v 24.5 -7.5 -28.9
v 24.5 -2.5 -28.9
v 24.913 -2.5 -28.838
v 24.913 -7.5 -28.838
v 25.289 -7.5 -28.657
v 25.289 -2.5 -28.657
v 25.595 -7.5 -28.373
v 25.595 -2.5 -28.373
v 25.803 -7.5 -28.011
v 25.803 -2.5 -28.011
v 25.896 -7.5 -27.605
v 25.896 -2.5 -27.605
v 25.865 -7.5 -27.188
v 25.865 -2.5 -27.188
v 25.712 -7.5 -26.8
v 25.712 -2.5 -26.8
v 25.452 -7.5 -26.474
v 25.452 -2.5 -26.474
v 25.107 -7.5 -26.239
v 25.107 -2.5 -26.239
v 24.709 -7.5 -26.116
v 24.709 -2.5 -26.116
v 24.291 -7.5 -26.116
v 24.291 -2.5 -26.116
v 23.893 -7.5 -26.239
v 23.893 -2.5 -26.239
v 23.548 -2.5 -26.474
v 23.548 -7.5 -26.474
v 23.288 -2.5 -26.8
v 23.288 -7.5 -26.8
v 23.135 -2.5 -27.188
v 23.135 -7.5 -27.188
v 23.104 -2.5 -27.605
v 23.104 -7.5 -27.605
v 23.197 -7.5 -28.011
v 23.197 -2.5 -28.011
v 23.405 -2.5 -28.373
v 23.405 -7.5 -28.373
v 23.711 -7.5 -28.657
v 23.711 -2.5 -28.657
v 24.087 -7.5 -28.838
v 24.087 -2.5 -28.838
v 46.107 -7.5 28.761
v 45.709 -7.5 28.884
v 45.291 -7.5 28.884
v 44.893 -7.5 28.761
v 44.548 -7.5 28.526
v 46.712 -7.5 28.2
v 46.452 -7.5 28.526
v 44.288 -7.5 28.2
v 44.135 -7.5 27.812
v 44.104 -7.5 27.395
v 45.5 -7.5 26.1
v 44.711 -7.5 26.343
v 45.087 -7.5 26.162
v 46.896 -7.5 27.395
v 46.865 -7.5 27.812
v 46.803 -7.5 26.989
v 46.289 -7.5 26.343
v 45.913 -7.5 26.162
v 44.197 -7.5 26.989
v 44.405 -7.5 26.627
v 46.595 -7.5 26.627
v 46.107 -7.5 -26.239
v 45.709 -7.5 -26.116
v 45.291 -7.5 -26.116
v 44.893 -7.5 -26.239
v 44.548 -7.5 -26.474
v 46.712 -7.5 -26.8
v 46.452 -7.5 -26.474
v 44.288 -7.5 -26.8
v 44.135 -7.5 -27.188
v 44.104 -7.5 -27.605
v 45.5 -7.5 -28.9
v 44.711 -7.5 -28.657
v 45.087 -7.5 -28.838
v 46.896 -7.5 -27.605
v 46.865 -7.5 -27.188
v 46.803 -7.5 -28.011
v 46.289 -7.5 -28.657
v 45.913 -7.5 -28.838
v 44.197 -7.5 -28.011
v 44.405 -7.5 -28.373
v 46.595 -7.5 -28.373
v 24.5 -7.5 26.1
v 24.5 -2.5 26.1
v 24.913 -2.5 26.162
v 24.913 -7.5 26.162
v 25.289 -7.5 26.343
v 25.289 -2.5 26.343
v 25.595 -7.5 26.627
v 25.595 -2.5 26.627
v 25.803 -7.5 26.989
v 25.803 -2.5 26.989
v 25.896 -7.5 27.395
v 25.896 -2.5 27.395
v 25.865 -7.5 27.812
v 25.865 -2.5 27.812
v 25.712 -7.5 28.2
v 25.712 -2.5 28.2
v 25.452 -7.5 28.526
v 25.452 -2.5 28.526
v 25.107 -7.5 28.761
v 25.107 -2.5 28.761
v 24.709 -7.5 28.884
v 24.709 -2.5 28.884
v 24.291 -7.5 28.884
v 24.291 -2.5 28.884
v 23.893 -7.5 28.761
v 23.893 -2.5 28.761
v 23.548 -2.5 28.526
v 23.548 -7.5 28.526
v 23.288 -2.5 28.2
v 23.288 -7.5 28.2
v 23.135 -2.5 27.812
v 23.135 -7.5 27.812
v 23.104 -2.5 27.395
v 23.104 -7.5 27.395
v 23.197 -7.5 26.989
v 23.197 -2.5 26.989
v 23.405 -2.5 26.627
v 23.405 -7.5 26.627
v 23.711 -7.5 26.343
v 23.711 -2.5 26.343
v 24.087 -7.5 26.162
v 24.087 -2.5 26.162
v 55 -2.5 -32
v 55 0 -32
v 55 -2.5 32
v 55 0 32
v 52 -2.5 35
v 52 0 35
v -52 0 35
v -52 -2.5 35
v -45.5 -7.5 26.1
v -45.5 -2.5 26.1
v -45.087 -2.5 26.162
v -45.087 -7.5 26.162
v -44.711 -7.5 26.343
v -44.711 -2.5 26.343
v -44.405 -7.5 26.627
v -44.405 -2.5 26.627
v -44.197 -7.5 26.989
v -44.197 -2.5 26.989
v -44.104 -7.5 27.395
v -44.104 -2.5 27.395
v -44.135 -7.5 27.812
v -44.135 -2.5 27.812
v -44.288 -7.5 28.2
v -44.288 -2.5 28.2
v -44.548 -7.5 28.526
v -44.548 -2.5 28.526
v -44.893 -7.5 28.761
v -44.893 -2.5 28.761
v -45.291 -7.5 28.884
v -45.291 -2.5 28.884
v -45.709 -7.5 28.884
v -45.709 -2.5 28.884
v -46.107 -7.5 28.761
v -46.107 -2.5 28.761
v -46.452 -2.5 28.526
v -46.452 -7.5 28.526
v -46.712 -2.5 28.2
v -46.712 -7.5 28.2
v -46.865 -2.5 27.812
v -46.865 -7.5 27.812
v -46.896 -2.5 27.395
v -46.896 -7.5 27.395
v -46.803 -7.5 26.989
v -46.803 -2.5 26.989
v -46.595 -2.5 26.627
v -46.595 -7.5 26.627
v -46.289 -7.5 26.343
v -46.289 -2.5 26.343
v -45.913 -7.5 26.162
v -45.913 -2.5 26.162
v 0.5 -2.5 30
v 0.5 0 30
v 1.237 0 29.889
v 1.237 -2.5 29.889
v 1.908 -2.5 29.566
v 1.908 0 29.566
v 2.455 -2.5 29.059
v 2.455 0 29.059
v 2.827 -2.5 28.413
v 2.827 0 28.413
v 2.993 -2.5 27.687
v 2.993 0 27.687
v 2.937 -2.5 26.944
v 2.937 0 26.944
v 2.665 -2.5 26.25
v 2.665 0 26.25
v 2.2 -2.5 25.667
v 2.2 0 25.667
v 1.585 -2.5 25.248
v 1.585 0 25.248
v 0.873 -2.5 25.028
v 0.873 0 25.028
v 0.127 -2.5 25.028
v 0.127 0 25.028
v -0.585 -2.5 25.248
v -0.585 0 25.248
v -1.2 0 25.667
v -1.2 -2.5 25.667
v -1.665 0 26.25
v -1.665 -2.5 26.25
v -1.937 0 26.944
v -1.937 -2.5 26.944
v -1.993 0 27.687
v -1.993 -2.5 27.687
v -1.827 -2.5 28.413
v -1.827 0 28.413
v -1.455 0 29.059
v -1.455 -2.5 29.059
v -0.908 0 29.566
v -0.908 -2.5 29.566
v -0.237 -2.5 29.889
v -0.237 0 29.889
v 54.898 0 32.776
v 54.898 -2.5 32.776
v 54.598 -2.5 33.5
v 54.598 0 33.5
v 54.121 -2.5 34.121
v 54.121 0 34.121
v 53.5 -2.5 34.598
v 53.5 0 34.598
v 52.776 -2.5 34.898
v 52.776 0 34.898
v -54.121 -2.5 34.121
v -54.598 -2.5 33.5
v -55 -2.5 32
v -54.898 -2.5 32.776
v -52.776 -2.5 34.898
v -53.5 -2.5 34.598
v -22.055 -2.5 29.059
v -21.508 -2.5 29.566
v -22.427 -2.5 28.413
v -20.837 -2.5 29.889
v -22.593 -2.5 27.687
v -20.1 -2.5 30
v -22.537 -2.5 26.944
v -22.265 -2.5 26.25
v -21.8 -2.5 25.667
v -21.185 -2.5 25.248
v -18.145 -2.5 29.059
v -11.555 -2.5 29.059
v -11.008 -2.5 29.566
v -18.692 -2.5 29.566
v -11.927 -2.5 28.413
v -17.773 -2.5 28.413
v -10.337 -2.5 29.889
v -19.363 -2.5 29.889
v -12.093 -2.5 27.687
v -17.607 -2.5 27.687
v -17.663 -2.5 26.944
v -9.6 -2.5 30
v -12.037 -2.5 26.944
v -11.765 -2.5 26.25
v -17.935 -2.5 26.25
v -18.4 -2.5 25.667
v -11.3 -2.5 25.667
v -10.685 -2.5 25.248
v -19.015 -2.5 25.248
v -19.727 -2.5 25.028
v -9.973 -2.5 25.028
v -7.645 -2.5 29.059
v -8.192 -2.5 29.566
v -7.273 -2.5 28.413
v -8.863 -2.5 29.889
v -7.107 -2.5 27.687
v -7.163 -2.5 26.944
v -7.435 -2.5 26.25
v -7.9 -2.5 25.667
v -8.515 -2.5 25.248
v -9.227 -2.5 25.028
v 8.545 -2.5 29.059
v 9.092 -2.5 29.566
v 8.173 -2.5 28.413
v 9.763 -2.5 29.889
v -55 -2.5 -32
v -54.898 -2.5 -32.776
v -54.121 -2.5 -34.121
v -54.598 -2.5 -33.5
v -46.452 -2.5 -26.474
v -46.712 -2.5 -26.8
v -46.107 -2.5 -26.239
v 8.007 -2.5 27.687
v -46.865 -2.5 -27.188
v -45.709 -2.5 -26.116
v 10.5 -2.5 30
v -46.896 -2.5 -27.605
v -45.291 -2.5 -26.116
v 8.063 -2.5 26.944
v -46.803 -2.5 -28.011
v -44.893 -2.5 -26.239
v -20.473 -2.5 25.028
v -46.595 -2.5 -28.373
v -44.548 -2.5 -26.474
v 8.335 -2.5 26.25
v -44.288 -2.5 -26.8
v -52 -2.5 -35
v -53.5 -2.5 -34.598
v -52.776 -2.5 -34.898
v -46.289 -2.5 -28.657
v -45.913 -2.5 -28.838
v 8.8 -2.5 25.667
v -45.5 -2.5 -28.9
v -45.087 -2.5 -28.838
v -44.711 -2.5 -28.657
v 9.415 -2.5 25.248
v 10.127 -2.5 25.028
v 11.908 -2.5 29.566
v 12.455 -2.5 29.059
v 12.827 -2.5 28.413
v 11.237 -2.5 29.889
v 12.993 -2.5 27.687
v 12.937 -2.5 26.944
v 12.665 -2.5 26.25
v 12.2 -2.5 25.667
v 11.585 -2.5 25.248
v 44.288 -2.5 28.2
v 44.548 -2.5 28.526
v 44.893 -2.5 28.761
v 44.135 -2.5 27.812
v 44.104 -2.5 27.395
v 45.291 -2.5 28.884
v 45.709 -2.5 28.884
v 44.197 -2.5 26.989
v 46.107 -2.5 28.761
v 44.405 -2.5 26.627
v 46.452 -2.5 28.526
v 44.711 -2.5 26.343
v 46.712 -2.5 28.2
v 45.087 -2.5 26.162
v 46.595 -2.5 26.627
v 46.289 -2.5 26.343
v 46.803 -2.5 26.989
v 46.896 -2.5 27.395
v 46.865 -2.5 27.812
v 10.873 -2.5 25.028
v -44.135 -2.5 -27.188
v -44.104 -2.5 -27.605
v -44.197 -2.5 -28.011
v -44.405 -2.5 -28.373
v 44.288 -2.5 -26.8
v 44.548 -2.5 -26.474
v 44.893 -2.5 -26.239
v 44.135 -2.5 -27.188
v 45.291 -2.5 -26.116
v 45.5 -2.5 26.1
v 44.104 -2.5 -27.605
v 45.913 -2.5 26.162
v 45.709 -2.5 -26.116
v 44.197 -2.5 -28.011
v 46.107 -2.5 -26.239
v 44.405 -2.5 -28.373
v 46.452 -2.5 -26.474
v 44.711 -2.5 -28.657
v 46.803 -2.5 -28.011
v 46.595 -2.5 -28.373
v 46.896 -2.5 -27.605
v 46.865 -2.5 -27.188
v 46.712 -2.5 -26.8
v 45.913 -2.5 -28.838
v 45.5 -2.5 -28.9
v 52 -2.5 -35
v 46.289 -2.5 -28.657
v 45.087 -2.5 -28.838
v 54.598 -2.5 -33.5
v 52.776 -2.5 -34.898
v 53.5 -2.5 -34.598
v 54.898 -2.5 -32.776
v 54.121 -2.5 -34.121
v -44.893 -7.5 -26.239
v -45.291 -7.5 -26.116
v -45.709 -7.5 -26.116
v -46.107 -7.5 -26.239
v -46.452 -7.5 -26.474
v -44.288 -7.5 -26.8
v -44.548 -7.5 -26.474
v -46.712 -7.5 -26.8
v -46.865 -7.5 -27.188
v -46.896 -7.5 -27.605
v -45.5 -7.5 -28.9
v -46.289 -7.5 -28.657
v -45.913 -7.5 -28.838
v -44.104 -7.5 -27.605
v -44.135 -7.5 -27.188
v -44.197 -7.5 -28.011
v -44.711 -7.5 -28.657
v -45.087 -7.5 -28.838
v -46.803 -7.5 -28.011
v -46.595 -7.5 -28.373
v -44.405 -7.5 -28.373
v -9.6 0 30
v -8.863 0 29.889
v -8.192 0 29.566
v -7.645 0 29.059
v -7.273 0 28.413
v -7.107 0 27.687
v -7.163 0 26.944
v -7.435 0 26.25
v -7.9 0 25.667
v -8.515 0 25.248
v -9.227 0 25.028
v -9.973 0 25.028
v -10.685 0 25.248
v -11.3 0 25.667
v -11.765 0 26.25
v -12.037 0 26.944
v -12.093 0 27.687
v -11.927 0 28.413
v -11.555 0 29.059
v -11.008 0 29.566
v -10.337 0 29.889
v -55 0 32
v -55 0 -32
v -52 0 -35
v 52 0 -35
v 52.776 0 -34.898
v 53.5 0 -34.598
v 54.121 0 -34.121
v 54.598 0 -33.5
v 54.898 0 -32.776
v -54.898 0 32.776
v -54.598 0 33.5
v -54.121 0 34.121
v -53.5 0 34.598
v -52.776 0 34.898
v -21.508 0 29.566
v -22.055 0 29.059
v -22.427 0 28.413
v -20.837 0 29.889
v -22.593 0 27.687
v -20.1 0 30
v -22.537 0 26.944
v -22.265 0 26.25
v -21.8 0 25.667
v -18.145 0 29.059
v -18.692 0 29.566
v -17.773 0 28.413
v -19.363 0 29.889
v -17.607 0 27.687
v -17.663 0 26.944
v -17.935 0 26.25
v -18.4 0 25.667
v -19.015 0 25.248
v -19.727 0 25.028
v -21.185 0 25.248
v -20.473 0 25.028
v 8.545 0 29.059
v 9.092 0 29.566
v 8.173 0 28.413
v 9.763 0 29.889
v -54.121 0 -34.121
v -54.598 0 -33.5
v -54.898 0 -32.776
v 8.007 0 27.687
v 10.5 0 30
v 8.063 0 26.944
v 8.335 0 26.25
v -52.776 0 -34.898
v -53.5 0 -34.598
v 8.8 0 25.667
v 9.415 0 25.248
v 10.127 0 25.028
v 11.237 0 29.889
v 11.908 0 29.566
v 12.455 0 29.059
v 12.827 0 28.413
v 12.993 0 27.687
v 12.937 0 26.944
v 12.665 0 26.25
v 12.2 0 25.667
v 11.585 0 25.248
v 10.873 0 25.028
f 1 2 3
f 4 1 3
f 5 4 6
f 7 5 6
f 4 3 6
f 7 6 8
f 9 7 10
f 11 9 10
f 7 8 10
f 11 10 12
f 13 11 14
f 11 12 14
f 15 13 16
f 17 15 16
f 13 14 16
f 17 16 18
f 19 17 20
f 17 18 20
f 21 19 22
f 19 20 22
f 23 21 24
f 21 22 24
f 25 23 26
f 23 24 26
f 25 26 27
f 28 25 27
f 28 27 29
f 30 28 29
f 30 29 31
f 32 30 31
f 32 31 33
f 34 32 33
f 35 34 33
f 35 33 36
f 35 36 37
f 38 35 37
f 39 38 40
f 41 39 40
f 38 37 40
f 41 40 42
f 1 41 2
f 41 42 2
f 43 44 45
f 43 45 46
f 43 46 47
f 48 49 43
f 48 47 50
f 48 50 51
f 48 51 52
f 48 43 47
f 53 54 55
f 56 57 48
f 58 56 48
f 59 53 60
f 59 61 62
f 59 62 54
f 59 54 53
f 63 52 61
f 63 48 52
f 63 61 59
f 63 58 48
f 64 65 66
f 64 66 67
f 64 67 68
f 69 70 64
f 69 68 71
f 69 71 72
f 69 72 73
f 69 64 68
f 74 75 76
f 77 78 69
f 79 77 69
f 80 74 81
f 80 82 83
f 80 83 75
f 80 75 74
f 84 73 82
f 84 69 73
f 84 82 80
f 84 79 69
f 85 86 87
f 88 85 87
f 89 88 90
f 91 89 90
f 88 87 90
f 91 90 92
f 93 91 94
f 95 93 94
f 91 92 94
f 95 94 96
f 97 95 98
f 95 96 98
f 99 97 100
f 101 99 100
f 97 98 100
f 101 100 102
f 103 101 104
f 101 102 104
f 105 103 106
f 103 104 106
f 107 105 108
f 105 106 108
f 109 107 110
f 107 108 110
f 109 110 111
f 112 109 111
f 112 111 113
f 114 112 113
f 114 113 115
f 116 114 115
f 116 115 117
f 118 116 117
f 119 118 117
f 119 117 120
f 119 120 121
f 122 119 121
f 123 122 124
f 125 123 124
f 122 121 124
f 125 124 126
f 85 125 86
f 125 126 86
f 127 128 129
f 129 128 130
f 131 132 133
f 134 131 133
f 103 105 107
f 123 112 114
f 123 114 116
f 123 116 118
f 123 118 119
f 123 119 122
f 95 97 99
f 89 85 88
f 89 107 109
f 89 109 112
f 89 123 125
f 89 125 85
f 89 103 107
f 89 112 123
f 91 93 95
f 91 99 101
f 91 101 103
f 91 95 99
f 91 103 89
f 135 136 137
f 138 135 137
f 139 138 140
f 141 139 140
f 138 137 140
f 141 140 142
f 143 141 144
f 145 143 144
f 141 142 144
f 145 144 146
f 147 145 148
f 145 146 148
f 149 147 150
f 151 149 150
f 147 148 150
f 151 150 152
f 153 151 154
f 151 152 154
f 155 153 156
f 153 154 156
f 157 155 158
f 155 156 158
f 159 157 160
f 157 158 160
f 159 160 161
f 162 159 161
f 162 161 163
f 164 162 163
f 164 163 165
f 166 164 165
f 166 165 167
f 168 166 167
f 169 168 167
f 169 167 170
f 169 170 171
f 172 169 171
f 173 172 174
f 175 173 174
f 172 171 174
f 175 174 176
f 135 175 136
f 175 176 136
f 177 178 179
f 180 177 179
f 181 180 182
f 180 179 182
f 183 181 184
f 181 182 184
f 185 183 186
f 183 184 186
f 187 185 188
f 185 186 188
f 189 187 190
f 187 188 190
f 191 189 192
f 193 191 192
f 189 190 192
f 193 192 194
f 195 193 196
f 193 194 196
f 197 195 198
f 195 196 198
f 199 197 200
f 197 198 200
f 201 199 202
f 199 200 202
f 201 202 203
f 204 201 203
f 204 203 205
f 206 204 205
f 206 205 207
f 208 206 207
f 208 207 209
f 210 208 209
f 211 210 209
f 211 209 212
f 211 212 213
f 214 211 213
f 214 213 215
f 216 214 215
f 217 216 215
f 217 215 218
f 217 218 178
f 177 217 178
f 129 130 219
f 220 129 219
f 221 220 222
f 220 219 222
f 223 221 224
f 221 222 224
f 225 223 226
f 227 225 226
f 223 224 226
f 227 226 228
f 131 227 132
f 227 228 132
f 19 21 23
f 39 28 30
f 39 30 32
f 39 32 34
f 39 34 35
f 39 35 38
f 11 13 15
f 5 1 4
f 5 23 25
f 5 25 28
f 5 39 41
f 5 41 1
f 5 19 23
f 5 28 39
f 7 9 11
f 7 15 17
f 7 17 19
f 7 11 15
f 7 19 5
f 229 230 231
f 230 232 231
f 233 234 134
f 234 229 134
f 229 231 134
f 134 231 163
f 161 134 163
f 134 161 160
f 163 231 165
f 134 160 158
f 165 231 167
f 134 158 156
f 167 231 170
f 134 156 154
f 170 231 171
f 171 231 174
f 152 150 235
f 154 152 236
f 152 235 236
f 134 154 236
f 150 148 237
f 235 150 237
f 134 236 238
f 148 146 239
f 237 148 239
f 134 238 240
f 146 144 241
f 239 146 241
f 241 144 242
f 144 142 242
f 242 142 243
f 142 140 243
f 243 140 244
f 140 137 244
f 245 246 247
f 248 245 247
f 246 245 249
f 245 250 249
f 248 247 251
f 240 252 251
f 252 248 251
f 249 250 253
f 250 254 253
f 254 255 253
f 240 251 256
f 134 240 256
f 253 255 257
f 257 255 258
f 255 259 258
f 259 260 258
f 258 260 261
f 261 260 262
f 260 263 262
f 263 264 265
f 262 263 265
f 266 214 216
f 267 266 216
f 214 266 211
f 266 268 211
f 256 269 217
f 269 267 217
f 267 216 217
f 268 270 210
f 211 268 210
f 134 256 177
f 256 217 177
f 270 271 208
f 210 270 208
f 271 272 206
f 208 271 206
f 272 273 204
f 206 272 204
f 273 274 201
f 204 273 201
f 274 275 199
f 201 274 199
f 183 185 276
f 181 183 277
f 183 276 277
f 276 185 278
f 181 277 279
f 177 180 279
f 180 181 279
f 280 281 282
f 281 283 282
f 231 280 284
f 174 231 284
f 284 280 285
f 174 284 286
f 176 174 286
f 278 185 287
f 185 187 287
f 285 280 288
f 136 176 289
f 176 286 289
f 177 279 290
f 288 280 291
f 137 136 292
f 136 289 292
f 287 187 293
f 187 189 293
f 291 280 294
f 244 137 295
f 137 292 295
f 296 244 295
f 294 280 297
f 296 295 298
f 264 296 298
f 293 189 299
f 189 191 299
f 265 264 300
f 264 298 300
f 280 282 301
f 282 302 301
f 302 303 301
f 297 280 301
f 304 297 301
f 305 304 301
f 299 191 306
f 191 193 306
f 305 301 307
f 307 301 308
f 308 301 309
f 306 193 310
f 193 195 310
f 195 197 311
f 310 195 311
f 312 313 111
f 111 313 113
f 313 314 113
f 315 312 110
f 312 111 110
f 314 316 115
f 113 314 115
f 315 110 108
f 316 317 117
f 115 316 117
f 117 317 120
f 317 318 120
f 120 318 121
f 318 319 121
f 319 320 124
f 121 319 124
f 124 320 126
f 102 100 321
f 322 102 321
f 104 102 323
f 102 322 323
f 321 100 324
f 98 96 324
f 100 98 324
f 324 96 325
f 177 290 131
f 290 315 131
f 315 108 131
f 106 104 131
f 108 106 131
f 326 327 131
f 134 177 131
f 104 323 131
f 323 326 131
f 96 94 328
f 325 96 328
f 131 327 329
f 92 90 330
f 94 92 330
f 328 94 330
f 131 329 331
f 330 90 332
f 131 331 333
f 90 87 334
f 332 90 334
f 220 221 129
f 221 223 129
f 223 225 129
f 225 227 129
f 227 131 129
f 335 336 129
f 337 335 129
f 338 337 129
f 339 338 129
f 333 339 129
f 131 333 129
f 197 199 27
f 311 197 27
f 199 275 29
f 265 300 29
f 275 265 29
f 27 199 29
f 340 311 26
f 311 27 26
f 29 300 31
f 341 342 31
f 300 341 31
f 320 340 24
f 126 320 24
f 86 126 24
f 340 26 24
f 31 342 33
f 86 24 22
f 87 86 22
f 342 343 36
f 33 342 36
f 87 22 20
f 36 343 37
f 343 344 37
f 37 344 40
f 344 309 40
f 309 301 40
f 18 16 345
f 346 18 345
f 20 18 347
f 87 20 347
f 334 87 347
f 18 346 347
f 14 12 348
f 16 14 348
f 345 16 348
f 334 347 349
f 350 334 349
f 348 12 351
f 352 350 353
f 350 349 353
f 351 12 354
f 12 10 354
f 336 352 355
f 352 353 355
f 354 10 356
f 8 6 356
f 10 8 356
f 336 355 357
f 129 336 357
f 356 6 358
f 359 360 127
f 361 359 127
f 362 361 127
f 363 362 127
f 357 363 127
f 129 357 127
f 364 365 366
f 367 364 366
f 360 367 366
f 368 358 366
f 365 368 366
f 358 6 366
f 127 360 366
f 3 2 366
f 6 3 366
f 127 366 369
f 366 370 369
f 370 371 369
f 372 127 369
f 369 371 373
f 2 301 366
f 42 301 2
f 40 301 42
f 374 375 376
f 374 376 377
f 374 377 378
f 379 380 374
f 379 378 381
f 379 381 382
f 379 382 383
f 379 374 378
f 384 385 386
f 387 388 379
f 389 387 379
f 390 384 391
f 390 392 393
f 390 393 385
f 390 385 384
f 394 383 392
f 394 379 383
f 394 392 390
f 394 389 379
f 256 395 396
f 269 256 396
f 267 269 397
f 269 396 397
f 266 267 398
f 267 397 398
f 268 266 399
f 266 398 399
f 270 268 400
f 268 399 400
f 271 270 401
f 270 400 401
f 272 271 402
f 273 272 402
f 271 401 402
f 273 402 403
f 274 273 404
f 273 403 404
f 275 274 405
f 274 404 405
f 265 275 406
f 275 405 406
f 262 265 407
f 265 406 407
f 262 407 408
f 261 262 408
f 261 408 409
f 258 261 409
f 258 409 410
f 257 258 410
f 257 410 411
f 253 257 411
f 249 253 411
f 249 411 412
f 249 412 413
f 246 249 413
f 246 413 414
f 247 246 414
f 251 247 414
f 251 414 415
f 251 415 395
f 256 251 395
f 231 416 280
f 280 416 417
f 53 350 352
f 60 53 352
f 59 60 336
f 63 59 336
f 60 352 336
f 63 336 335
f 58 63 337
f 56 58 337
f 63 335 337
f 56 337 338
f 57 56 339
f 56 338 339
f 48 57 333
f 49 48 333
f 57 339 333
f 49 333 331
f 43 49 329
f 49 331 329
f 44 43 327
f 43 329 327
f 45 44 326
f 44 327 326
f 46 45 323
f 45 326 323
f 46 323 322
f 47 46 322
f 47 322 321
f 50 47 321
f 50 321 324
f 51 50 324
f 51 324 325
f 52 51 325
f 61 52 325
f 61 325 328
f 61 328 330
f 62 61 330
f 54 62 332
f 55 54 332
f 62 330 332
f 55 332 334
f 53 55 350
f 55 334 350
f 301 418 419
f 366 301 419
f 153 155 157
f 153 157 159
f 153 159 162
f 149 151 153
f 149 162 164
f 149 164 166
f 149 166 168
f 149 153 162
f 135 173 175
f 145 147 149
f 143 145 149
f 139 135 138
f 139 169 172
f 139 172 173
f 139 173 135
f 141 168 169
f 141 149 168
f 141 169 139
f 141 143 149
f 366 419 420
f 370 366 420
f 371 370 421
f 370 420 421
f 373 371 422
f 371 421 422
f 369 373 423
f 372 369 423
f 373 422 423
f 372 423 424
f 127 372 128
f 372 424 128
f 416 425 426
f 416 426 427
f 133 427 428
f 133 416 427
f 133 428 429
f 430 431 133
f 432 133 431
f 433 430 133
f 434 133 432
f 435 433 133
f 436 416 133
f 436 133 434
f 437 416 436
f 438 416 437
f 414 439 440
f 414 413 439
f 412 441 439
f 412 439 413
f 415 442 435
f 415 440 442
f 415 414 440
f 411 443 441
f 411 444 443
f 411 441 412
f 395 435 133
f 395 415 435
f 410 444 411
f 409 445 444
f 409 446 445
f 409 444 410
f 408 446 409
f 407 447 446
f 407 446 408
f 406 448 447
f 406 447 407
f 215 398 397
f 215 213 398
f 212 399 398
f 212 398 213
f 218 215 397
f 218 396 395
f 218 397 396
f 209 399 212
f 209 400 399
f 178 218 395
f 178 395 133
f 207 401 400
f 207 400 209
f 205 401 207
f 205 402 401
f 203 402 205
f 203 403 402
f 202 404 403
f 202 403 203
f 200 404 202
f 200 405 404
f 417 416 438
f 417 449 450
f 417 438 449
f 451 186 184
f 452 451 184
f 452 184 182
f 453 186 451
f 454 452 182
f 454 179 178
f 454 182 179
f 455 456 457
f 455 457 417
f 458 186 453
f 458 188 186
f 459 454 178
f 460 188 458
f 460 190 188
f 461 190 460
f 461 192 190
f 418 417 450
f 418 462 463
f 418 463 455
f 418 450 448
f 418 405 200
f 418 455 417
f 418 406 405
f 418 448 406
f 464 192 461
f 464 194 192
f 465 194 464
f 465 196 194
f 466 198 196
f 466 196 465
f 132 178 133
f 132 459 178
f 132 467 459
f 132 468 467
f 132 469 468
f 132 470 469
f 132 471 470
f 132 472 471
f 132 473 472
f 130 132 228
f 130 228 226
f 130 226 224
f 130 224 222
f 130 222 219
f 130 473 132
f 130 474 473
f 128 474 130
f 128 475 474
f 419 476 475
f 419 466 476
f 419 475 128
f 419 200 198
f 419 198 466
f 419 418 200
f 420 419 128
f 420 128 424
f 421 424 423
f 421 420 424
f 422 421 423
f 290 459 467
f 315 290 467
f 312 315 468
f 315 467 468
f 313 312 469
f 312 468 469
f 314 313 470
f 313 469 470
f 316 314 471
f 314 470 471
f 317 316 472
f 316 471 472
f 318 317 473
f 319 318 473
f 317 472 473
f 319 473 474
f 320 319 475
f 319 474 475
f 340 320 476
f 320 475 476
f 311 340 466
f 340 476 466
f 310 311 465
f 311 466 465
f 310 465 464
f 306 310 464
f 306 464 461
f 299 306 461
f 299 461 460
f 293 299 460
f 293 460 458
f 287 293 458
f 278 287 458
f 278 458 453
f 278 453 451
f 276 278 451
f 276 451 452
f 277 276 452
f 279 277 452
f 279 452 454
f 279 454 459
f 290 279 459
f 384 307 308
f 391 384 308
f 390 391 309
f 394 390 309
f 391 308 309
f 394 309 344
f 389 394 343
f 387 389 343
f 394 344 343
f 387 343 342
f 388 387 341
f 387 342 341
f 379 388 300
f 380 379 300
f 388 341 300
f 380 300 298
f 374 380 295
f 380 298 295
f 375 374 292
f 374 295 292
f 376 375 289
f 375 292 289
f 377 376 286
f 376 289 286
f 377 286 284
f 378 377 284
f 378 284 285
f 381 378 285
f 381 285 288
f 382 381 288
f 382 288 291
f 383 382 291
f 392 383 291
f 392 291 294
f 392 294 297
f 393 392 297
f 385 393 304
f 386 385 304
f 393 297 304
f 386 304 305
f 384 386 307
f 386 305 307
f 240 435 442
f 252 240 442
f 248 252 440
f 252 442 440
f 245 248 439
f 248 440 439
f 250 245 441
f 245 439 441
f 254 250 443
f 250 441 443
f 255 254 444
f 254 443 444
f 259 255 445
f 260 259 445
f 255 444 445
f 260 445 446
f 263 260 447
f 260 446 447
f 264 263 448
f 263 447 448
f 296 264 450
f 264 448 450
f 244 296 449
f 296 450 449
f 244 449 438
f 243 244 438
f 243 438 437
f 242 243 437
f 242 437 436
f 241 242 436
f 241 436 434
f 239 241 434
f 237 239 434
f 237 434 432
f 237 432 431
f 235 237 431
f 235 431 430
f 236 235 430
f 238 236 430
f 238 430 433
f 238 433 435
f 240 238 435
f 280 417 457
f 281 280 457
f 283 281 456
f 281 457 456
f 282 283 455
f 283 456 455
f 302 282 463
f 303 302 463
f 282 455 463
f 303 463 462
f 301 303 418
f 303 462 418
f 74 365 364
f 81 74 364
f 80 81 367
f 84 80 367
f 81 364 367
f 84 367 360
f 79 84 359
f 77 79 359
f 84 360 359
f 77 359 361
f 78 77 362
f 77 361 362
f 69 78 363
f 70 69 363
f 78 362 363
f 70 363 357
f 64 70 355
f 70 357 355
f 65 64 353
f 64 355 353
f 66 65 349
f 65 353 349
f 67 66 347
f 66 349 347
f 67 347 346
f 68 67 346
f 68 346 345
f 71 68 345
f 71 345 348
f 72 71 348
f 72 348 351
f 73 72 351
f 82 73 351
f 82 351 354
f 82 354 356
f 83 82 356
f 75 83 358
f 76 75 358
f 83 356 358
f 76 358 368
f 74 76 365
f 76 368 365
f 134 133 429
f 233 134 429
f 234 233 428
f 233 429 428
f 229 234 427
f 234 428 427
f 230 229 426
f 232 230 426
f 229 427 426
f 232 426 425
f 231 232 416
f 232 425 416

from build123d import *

# Parameters (mm, degrees)
BOSS_EXTRUDE1_DEPTH  = 2.5
BOSS_EXTRUDE6_DEPTH  = 24.5
CUT_EXTRUDE7_REACH   = 72.562
SKETCH3_R            = 2.5
BOSS_EXTRUDE11_START = -24.5
SKETCH12_R           = 1.4
BOSS_EXTRUDE11_DEPTH = 20
CUT_EXTRUDE11_REACH  = 120.55
SKETCH13_R           = 6.15
BOSS_EXTRUDE13_START = -4.5
SKETCH12_5_R         = 1.4
BOSS_EXTRUDE13_DEPTH = 2
CUT_EXTRUDE12_START  = -24.5
CUT_EXTRUDE12_DEPTH  = 24.5
BOSS_EXTRUDE14_START = -24.5
SKETCH12_6_R         = 1.4
BOSS_EXTRUDE14_DEPTH = 5


with BuildPart() as part:
    # Sketch1 → Boss-Extrude1 (new body)
    with BuildSketch(Plane(origin=(0, 0, 0), x_dir=(1, 0, 0), z_dir=(0, 1, 0))):
        with BuildLine():
            Line((-52, -35), (52, -35))
            ThreePointArc((52, -35), (54.121320344, -34.121320344), (55, -32))
            Line((55, -32), (55, 32))
            ThreePointArc((55, 32), (54.121320344, 34.121320344), (52, 35))
            Line((52, 35), (-52, 35))
            ThreePointArc((-52, 35), (-54.121320344, 34.121320344), (-55, 32))
            Line((-55, 32), (-55, -32))
            ThreePointArc((-55, -32), (-54.121320344, -34.121320344), (-52, -35))
        make_face()
    extrude(amount=-BOSS_EXTRUDE1_DEPTH)

    # Sketch7 → Boss-Extrude6 (add)
    with BuildSketch(Plane.XZ.offset(2.5)):
        with BuildLine():
            Line((-55, 32), (-55, -32))
            ThreePointArc((-55, -32), (-54.121320344, -34.121320344), (-52, -35))
            Line((-52, -35), (52, -35))
            ThreePointArc((52, -35), (54.121320344, -34.121320344), (55, -32))
            Line((55, -32), (55, 32))
            ThreePointArc((55, 32), (54.121320344, 34.121320344), (52, 35))
            Line((52, 35), (-52, 35))
            ThreePointArc((-52, 35), (-54.121320344, 34.121320344), (-55, 32))
        make_face()
        with BuildLine():
            Line((-53.5, 32), (-53.5, -32))
            ThreePointArc((-53.5, -32), (-53.060660172, -33.060660172), (-52, -33.5))
            Line((-52, -33.5), (52, -33.5))
            ThreePointArc((52, -33.5), (53.060660172, -33.060660172), (53.5, -32))
            Line((53.5, -32), (53.5, 32))
            ThreePointArc((53.5, 32), (53.060660172, 33.060660172), (52, 33.5))
            Line((52, 33.5), (-52, 33.5))
            ThreePointArc((-52, 33.5), (-53.060660172, 33.060660172), (-53.5, 32))
        make_face(mode=Mode.SUBTRACT)
    extrude(amount=BOSS_EXTRUDE6_DEPTH)

    # Sketch3 → Cut-Extrude7 (cut, up to next)
    with BuildSketch(Plane(origin=(0, 0, 0), x_dir=(1, 0, 0), z_dir=(0, 1, 0)), mode=Mode.PRIVATE) as cut_extrude7_sk1:
        with Locations(Location((-20.1, -27.5, 0), (0, 0, 270))):
            Circle(SKETCH3_R)
    cut_extrude7_tool1 = extrude(cut_extrude7_sk1.sketch, amount=-CUT_EXTRUDE7_REACH, mode=Mode.PRIVATE) & part.part
    # Sketch3 → Cut-Extrude7 (cut, up to next)
    with BuildSketch(Plane(origin=(0, 0, 0), x_dir=(1, 0, 0), z_dir=(0, 1, 0)), mode=Mode.PRIVATE) as cut_extrude7_sk2:
        with Locations(Location((-9.6, -27.5, 0), (0, 0, 270))):
            Circle(SKETCH3_R)
    cut_extrude7_tool2 = extrude(cut_extrude7_sk2.sketch, amount=-CUT_EXTRUDE7_REACH, mode=Mode.PRIVATE) & part.part
    # Sketch3 → Cut-Extrude7 (cut, up to next)
    with BuildSketch(Plane(origin=(0, 0, 0), x_dir=(1, 0, 0), z_dir=(0, 1, 0)), mode=Mode.PRIVATE) as cut_extrude7_sk3:
        with Locations(Location((0.5, -27.5, 0), (0, 0, 270))):
            Circle(SKETCH3_R)
    cut_extrude7_tool3 = extrude(cut_extrude7_sk3.sketch, amount=-CUT_EXTRUDE7_REACH, mode=Mode.PRIVATE) & part.part
    # Sketch3 → Cut-Extrude7 (cut, up to next)
    with BuildSketch(Plane(origin=(0, 0, 0), x_dir=(1, 0, 0), z_dir=(0, 1, 0)), mode=Mode.PRIVATE) as cut_extrude7_sk4:
        with Locations(Location((10.5, -27.5, 0), (0, 0, 270))):
            Circle(SKETCH3_R)
    cut_extrude7_tool4 = extrude(cut_extrude7_sk4.sketch, amount=-CUT_EXTRUDE7_REACH, mode=Mode.PRIVATE) & part.part
    add(cut_extrude7_tool1.solids().sort_by_distance((-20.1, 0, 27.5))[0], mode=Mode.SUBTRACT)
    add(cut_extrude7_tool2.solids().sort_by_distance((-9.6, 0, 27.5))[0], mode=Mode.SUBTRACT)
    add(cut_extrude7_tool3.solids().sort_by_distance((0.5, 0, 27.5))[0], mode=Mode.SUBTRACT)
    add(cut_extrude7_tool4.solids().sort_by_distance((10.5, 0, 27.5))[0], mode=Mode.SUBTRACT)

    # Sketch12 → Boss-Extrude11 (add)
    # profile 1 of 6: a face of its own
    with BuildSketch(Plane.XZ.offset(27).offset(BOSS_EXTRUDE11_START)):
        with BuildLine():
            Line((-39.5, 27.5), (-39.5, 33.5))
            Line((-39.5, 33.5), (-52, 33.5))
            ThreePointArc((-52, 33.5), (-53.060660172, 33.060660172), (-53.5, 32))
            Line((-53.5, 32), (-53.5, 22.5))
            Line((-53.5, 22.5), (-44.5, 22.5))
            ThreePointArc((-44.5, 22.5), (-40.964466094, 23.964466094), (-39.5, 27.5))
        make_face()
        with Locations(Location((-45.5, 27.5, 0), (0, 0, 270))):
            Circle(SKETCH12_R, mode=Mode.SUBTRACT)
    # profile 2 of 6: a face of its own
    with BuildSketch(Plane.XZ.offset(27).offset(BOSS_EXTRUDE11_START)):
        with BuildLine():
            Line((29.5, 33.5), (18.5, 33.5))
            Line((18.5, 33.5), (18.5, 27.5))
            ThreePointArc((18.5, 27.5), (19.964466094, 23.964466094), (23.5, 22.5))
            Line((23.5, 22.5), (24.5, 22.5))
            ThreePointArc((24.5, 22.5), (28.035533906, 23.964466094), (29.5, 27.5))
            Line((29.5, 27.5), (29.5, 33.5))
        make_face()
        with Locations(Location((24.5, 27.5, 0), (0, 0, 270))):
            Circle(SKETCH12_R, mode=Mode.SUBTRACT)
    # profile 3 of 6: a face of its own
    with BuildSketch(Plane.XZ.offset(27).offset(BOSS_EXTRUDE11_START)):
        with BuildLine():
            Line((18.5, -27.5), (18.5, -33.5))
            Line((18.5, -33.5), (29.5, -33.5))
            Line((29.5, -33.5), (29.5, -27.5))
            ThreePointArc((29.5, -27.5), (28.035533906, -23.964466094), (24.5, -22.5))
            Line((24.5, -22.5), (23.5, -22.5))
            ThreePointArc((23.5, -22.5), (19.964466094, -23.964466094), (18.5, -27.5))
        make_face()
        with Locations(Location((24.5, -27.5, 0), (0, 0, 270))):
            Circle(SKETCH12_R, mode=Mode.SUBTRACT)
    # profile 4 of 6: a face of its own
    with BuildSketch(Plane.XZ.offset(27).offset(BOSS_EXTRUDE11_START)):
        with BuildLine():
            Line((-44.5, -22.5), (-53.5, -22.5))
            Line((-53.5, -22.5), (-53.5, -32))
            ThreePointArc((-53.5, -32), (-53.060660172, -33.060660172), (-52, -33.5))
            Line((-52, -33.5), (-39.5, -33.5))
            Line((-39.5, -33.5), (-39.5, -27.5))
            ThreePointArc((-39.5, -27.5), (-40.964466094, -23.964466094), (-44.5, -22.5))
        make_face()
        with Locations(Location((-45.5, -27.5, 0), (0, 0, 270))):
            Circle(SKETCH12_R, mode=Mode.SUBTRACT)
    # profile 5 of 6: a face of its own
    with BuildSketch(Plane.XZ.offset(27).offset(BOSS_EXTRUDE11_START)):
        with BuildLine():
            Line((52, 33.5), (39.5, 33.5))
            Line((39.5, 33.5), (39.5, 27.5))
            ThreePointArc((39.5, 27.5), (40.964466094, 23.964466094), (44.5, 22.5))
            Line((44.5, 22.5), (53.5, 22.5))
            Line((53.5, 22.5), (53.5, 32))
            ThreePointArc((53.5, 32), (53.060660172, 33.060660172), (52, 33.5))
        make_face()
        with Locations(Location((45.5, 27.5, 0), (0, 0, 270))):
            Circle(SKETCH12_R, mode=Mode.SUBTRACT)
    # profile 6 of 6: a face of its own
    with BuildSketch(Plane.XZ.offset(27).offset(BOSS_EXTRUDE11_START)):
        with BuildLine():
            Line((53.5, -32), (53.5, -22.5))
            Line((53.5, -22.5), (44.5, -22.5))
            ThreePointArc((44.5, -22.5), (40.964466094, -23.964466094), (39.5, -27.5))
            Line((39.5, -27.5), (39.5, -33.5))
            Line((39.5, -33.5), (52, -33.5))
            ThreePointArc((52, -33.5), (53.060660172, -33.060660172), (53.5, -32))
        make_face()
        with Locations(Location((45.5, -27.5, 0), (0, 0, 270))):
            Circle(SKETCH12_R, mode=Mode.SUBTRACT)
    extrude(amount=BOSS_EXTRUDE11_DEPTH)

    # Sketch13 → Cut-Extrude11 (cut, up to next)
    with BuildSketch(Plane(origin=(55, 0, 0), x_dir=(0, 0, -1), z_dir=(1, 0, 0)), mode=Mode.PRIVATE) as cut_extrude11_sk1:
        with Locations((-12, -17)):
            Circle(SKETCH13_R)
    cut_extrude11_tool1 = extrude(cut_extrude11_sk1.sketch, amount=-CUT_EXTRUDE11_REACH, mode=Mode.PRIVATE) & part.part
    add(cut_extrude11_tool1.solids().sort_by_distance((55, -17, 12))[0], mode=Mode.SUBTRACT)

    # Sketch12<5> → Boss-Extrude13 (add)
    # profile 1 of 2: a face of its own
    with BuildSketch(Plane.XZ.offset(27).offset(BOSS_EXTRUDE13_START)):
        with BuildLine():
            Line((44.5, 22.5), (53.5, 22.5))
            Line((53.5, 22.5), (53.5, 32))
            ThreePointArc((53.5, 32), (53.060660172, 33.060660172), (52, 33.5))
            Line((52, 33.5), (39.5, 33.5))
            Line((39.5, 33.5), (39.5, 27.5))
            ThreePointArc((39.5, 27.5), (40.964466094, 23.964466094), (44.5, 22.5))
        make_face()
        with Locations(Location((45.5, 27.5, 0), (0, 0, 270))):
            Circle(SKETCH12_5_R, mode=Mode.SUBTRACT)
    # profile 2 of 2: a face of its own
    with BuildSketch(Plane.XZ.offset(27).offset(BOSS_EXTRUDE13_START)):
        with BuildLine():
            Line((39.5, -27.5), (39.5, -33.5))
            Line((39.5, -33.5), (52, -33.5))
            ThreePointArc((52, -33.5), (53.060660172, -33.060660172), (53.5, -32))
            Line((53.5, -32), (53.5, -22.5))
            Line((53.5, -22.5), (44.5, -22.5))
            ThreePointArc((44.5, -22.5), (40.964466094, -23.964466094), (39.5, -27.5))
        make_face()
        with Locations(Location((45.5, -27.5, 0), (0, 0, 270))):
            Circle(SKETCH12_5_R, mode=Mode.SUBTRACT)
    extrude(amount=BOSS_EXTRUDE13_DEPTH)

    # Sketch14 → Cut-Extrude12 (cut)
    with BuildSketch(Plane.XZ.offset(27).offset(CUT_EXTRUDE12_START)):
        with BuildLine():
            Line((-55, 32), (-55, -32))
            ThreePointArc((-55, -32), (-54.121320344, -34.121320344), (-52, -35))
            Line((-52, -35), (52, -35))
            ThreePointArc((52, -35), (54.121320344, -34.121320344), (55, -32))
            Line((55, -32), (55, 32))
            ThreePointArc((55, 32), (54.121320344, 34.121320344), (52, 35))
            Line((52, 35), (-52, 35))
            ThreePointArc((-52, 35), (-54.121320344, 34.121320344), (-55, 32))
        make_face()
    extrude(amount=CUT_EXTRUDE12_DEPTH, mode=Mode.SUBTRACT)

    # Sketch12<6> → Boss-Extrude14 (add)
    with BuildSketch(Plane.XZ.offset(27).offset(BOSS_EXTRUDE14_START)):
        with Locations(Location((-45.5, 27.5, 0), (0, 0, 270))):
            Circle(SKETCH12_6_R)
        with Locations(Location((-45.5, -27.5, 0), (0, 0, 270))):
            Circle(SKETCH12_6_R)
        with Locations(Location((24.5, -27.5, 0), (0, 0, 270))):
            Circle(SKETCH12_6_R)
        with Locations(Location((45.5, -27.5, 0), (0, 0, 270))):
            Circle(SKETCH12_6_R)
        with Locations(Location((45.5, 27.5, 0), (0, 0, 270))):
            Circle(SKETCH12_6_R)
        with Locations(Location((24.5, 27.5, 0), (0, 0, 270))):
            Circle(SKETCH12_6_R)
    extrude(amount=BOSS_EXTRUDE14_DEPTH)


solid = part.part
